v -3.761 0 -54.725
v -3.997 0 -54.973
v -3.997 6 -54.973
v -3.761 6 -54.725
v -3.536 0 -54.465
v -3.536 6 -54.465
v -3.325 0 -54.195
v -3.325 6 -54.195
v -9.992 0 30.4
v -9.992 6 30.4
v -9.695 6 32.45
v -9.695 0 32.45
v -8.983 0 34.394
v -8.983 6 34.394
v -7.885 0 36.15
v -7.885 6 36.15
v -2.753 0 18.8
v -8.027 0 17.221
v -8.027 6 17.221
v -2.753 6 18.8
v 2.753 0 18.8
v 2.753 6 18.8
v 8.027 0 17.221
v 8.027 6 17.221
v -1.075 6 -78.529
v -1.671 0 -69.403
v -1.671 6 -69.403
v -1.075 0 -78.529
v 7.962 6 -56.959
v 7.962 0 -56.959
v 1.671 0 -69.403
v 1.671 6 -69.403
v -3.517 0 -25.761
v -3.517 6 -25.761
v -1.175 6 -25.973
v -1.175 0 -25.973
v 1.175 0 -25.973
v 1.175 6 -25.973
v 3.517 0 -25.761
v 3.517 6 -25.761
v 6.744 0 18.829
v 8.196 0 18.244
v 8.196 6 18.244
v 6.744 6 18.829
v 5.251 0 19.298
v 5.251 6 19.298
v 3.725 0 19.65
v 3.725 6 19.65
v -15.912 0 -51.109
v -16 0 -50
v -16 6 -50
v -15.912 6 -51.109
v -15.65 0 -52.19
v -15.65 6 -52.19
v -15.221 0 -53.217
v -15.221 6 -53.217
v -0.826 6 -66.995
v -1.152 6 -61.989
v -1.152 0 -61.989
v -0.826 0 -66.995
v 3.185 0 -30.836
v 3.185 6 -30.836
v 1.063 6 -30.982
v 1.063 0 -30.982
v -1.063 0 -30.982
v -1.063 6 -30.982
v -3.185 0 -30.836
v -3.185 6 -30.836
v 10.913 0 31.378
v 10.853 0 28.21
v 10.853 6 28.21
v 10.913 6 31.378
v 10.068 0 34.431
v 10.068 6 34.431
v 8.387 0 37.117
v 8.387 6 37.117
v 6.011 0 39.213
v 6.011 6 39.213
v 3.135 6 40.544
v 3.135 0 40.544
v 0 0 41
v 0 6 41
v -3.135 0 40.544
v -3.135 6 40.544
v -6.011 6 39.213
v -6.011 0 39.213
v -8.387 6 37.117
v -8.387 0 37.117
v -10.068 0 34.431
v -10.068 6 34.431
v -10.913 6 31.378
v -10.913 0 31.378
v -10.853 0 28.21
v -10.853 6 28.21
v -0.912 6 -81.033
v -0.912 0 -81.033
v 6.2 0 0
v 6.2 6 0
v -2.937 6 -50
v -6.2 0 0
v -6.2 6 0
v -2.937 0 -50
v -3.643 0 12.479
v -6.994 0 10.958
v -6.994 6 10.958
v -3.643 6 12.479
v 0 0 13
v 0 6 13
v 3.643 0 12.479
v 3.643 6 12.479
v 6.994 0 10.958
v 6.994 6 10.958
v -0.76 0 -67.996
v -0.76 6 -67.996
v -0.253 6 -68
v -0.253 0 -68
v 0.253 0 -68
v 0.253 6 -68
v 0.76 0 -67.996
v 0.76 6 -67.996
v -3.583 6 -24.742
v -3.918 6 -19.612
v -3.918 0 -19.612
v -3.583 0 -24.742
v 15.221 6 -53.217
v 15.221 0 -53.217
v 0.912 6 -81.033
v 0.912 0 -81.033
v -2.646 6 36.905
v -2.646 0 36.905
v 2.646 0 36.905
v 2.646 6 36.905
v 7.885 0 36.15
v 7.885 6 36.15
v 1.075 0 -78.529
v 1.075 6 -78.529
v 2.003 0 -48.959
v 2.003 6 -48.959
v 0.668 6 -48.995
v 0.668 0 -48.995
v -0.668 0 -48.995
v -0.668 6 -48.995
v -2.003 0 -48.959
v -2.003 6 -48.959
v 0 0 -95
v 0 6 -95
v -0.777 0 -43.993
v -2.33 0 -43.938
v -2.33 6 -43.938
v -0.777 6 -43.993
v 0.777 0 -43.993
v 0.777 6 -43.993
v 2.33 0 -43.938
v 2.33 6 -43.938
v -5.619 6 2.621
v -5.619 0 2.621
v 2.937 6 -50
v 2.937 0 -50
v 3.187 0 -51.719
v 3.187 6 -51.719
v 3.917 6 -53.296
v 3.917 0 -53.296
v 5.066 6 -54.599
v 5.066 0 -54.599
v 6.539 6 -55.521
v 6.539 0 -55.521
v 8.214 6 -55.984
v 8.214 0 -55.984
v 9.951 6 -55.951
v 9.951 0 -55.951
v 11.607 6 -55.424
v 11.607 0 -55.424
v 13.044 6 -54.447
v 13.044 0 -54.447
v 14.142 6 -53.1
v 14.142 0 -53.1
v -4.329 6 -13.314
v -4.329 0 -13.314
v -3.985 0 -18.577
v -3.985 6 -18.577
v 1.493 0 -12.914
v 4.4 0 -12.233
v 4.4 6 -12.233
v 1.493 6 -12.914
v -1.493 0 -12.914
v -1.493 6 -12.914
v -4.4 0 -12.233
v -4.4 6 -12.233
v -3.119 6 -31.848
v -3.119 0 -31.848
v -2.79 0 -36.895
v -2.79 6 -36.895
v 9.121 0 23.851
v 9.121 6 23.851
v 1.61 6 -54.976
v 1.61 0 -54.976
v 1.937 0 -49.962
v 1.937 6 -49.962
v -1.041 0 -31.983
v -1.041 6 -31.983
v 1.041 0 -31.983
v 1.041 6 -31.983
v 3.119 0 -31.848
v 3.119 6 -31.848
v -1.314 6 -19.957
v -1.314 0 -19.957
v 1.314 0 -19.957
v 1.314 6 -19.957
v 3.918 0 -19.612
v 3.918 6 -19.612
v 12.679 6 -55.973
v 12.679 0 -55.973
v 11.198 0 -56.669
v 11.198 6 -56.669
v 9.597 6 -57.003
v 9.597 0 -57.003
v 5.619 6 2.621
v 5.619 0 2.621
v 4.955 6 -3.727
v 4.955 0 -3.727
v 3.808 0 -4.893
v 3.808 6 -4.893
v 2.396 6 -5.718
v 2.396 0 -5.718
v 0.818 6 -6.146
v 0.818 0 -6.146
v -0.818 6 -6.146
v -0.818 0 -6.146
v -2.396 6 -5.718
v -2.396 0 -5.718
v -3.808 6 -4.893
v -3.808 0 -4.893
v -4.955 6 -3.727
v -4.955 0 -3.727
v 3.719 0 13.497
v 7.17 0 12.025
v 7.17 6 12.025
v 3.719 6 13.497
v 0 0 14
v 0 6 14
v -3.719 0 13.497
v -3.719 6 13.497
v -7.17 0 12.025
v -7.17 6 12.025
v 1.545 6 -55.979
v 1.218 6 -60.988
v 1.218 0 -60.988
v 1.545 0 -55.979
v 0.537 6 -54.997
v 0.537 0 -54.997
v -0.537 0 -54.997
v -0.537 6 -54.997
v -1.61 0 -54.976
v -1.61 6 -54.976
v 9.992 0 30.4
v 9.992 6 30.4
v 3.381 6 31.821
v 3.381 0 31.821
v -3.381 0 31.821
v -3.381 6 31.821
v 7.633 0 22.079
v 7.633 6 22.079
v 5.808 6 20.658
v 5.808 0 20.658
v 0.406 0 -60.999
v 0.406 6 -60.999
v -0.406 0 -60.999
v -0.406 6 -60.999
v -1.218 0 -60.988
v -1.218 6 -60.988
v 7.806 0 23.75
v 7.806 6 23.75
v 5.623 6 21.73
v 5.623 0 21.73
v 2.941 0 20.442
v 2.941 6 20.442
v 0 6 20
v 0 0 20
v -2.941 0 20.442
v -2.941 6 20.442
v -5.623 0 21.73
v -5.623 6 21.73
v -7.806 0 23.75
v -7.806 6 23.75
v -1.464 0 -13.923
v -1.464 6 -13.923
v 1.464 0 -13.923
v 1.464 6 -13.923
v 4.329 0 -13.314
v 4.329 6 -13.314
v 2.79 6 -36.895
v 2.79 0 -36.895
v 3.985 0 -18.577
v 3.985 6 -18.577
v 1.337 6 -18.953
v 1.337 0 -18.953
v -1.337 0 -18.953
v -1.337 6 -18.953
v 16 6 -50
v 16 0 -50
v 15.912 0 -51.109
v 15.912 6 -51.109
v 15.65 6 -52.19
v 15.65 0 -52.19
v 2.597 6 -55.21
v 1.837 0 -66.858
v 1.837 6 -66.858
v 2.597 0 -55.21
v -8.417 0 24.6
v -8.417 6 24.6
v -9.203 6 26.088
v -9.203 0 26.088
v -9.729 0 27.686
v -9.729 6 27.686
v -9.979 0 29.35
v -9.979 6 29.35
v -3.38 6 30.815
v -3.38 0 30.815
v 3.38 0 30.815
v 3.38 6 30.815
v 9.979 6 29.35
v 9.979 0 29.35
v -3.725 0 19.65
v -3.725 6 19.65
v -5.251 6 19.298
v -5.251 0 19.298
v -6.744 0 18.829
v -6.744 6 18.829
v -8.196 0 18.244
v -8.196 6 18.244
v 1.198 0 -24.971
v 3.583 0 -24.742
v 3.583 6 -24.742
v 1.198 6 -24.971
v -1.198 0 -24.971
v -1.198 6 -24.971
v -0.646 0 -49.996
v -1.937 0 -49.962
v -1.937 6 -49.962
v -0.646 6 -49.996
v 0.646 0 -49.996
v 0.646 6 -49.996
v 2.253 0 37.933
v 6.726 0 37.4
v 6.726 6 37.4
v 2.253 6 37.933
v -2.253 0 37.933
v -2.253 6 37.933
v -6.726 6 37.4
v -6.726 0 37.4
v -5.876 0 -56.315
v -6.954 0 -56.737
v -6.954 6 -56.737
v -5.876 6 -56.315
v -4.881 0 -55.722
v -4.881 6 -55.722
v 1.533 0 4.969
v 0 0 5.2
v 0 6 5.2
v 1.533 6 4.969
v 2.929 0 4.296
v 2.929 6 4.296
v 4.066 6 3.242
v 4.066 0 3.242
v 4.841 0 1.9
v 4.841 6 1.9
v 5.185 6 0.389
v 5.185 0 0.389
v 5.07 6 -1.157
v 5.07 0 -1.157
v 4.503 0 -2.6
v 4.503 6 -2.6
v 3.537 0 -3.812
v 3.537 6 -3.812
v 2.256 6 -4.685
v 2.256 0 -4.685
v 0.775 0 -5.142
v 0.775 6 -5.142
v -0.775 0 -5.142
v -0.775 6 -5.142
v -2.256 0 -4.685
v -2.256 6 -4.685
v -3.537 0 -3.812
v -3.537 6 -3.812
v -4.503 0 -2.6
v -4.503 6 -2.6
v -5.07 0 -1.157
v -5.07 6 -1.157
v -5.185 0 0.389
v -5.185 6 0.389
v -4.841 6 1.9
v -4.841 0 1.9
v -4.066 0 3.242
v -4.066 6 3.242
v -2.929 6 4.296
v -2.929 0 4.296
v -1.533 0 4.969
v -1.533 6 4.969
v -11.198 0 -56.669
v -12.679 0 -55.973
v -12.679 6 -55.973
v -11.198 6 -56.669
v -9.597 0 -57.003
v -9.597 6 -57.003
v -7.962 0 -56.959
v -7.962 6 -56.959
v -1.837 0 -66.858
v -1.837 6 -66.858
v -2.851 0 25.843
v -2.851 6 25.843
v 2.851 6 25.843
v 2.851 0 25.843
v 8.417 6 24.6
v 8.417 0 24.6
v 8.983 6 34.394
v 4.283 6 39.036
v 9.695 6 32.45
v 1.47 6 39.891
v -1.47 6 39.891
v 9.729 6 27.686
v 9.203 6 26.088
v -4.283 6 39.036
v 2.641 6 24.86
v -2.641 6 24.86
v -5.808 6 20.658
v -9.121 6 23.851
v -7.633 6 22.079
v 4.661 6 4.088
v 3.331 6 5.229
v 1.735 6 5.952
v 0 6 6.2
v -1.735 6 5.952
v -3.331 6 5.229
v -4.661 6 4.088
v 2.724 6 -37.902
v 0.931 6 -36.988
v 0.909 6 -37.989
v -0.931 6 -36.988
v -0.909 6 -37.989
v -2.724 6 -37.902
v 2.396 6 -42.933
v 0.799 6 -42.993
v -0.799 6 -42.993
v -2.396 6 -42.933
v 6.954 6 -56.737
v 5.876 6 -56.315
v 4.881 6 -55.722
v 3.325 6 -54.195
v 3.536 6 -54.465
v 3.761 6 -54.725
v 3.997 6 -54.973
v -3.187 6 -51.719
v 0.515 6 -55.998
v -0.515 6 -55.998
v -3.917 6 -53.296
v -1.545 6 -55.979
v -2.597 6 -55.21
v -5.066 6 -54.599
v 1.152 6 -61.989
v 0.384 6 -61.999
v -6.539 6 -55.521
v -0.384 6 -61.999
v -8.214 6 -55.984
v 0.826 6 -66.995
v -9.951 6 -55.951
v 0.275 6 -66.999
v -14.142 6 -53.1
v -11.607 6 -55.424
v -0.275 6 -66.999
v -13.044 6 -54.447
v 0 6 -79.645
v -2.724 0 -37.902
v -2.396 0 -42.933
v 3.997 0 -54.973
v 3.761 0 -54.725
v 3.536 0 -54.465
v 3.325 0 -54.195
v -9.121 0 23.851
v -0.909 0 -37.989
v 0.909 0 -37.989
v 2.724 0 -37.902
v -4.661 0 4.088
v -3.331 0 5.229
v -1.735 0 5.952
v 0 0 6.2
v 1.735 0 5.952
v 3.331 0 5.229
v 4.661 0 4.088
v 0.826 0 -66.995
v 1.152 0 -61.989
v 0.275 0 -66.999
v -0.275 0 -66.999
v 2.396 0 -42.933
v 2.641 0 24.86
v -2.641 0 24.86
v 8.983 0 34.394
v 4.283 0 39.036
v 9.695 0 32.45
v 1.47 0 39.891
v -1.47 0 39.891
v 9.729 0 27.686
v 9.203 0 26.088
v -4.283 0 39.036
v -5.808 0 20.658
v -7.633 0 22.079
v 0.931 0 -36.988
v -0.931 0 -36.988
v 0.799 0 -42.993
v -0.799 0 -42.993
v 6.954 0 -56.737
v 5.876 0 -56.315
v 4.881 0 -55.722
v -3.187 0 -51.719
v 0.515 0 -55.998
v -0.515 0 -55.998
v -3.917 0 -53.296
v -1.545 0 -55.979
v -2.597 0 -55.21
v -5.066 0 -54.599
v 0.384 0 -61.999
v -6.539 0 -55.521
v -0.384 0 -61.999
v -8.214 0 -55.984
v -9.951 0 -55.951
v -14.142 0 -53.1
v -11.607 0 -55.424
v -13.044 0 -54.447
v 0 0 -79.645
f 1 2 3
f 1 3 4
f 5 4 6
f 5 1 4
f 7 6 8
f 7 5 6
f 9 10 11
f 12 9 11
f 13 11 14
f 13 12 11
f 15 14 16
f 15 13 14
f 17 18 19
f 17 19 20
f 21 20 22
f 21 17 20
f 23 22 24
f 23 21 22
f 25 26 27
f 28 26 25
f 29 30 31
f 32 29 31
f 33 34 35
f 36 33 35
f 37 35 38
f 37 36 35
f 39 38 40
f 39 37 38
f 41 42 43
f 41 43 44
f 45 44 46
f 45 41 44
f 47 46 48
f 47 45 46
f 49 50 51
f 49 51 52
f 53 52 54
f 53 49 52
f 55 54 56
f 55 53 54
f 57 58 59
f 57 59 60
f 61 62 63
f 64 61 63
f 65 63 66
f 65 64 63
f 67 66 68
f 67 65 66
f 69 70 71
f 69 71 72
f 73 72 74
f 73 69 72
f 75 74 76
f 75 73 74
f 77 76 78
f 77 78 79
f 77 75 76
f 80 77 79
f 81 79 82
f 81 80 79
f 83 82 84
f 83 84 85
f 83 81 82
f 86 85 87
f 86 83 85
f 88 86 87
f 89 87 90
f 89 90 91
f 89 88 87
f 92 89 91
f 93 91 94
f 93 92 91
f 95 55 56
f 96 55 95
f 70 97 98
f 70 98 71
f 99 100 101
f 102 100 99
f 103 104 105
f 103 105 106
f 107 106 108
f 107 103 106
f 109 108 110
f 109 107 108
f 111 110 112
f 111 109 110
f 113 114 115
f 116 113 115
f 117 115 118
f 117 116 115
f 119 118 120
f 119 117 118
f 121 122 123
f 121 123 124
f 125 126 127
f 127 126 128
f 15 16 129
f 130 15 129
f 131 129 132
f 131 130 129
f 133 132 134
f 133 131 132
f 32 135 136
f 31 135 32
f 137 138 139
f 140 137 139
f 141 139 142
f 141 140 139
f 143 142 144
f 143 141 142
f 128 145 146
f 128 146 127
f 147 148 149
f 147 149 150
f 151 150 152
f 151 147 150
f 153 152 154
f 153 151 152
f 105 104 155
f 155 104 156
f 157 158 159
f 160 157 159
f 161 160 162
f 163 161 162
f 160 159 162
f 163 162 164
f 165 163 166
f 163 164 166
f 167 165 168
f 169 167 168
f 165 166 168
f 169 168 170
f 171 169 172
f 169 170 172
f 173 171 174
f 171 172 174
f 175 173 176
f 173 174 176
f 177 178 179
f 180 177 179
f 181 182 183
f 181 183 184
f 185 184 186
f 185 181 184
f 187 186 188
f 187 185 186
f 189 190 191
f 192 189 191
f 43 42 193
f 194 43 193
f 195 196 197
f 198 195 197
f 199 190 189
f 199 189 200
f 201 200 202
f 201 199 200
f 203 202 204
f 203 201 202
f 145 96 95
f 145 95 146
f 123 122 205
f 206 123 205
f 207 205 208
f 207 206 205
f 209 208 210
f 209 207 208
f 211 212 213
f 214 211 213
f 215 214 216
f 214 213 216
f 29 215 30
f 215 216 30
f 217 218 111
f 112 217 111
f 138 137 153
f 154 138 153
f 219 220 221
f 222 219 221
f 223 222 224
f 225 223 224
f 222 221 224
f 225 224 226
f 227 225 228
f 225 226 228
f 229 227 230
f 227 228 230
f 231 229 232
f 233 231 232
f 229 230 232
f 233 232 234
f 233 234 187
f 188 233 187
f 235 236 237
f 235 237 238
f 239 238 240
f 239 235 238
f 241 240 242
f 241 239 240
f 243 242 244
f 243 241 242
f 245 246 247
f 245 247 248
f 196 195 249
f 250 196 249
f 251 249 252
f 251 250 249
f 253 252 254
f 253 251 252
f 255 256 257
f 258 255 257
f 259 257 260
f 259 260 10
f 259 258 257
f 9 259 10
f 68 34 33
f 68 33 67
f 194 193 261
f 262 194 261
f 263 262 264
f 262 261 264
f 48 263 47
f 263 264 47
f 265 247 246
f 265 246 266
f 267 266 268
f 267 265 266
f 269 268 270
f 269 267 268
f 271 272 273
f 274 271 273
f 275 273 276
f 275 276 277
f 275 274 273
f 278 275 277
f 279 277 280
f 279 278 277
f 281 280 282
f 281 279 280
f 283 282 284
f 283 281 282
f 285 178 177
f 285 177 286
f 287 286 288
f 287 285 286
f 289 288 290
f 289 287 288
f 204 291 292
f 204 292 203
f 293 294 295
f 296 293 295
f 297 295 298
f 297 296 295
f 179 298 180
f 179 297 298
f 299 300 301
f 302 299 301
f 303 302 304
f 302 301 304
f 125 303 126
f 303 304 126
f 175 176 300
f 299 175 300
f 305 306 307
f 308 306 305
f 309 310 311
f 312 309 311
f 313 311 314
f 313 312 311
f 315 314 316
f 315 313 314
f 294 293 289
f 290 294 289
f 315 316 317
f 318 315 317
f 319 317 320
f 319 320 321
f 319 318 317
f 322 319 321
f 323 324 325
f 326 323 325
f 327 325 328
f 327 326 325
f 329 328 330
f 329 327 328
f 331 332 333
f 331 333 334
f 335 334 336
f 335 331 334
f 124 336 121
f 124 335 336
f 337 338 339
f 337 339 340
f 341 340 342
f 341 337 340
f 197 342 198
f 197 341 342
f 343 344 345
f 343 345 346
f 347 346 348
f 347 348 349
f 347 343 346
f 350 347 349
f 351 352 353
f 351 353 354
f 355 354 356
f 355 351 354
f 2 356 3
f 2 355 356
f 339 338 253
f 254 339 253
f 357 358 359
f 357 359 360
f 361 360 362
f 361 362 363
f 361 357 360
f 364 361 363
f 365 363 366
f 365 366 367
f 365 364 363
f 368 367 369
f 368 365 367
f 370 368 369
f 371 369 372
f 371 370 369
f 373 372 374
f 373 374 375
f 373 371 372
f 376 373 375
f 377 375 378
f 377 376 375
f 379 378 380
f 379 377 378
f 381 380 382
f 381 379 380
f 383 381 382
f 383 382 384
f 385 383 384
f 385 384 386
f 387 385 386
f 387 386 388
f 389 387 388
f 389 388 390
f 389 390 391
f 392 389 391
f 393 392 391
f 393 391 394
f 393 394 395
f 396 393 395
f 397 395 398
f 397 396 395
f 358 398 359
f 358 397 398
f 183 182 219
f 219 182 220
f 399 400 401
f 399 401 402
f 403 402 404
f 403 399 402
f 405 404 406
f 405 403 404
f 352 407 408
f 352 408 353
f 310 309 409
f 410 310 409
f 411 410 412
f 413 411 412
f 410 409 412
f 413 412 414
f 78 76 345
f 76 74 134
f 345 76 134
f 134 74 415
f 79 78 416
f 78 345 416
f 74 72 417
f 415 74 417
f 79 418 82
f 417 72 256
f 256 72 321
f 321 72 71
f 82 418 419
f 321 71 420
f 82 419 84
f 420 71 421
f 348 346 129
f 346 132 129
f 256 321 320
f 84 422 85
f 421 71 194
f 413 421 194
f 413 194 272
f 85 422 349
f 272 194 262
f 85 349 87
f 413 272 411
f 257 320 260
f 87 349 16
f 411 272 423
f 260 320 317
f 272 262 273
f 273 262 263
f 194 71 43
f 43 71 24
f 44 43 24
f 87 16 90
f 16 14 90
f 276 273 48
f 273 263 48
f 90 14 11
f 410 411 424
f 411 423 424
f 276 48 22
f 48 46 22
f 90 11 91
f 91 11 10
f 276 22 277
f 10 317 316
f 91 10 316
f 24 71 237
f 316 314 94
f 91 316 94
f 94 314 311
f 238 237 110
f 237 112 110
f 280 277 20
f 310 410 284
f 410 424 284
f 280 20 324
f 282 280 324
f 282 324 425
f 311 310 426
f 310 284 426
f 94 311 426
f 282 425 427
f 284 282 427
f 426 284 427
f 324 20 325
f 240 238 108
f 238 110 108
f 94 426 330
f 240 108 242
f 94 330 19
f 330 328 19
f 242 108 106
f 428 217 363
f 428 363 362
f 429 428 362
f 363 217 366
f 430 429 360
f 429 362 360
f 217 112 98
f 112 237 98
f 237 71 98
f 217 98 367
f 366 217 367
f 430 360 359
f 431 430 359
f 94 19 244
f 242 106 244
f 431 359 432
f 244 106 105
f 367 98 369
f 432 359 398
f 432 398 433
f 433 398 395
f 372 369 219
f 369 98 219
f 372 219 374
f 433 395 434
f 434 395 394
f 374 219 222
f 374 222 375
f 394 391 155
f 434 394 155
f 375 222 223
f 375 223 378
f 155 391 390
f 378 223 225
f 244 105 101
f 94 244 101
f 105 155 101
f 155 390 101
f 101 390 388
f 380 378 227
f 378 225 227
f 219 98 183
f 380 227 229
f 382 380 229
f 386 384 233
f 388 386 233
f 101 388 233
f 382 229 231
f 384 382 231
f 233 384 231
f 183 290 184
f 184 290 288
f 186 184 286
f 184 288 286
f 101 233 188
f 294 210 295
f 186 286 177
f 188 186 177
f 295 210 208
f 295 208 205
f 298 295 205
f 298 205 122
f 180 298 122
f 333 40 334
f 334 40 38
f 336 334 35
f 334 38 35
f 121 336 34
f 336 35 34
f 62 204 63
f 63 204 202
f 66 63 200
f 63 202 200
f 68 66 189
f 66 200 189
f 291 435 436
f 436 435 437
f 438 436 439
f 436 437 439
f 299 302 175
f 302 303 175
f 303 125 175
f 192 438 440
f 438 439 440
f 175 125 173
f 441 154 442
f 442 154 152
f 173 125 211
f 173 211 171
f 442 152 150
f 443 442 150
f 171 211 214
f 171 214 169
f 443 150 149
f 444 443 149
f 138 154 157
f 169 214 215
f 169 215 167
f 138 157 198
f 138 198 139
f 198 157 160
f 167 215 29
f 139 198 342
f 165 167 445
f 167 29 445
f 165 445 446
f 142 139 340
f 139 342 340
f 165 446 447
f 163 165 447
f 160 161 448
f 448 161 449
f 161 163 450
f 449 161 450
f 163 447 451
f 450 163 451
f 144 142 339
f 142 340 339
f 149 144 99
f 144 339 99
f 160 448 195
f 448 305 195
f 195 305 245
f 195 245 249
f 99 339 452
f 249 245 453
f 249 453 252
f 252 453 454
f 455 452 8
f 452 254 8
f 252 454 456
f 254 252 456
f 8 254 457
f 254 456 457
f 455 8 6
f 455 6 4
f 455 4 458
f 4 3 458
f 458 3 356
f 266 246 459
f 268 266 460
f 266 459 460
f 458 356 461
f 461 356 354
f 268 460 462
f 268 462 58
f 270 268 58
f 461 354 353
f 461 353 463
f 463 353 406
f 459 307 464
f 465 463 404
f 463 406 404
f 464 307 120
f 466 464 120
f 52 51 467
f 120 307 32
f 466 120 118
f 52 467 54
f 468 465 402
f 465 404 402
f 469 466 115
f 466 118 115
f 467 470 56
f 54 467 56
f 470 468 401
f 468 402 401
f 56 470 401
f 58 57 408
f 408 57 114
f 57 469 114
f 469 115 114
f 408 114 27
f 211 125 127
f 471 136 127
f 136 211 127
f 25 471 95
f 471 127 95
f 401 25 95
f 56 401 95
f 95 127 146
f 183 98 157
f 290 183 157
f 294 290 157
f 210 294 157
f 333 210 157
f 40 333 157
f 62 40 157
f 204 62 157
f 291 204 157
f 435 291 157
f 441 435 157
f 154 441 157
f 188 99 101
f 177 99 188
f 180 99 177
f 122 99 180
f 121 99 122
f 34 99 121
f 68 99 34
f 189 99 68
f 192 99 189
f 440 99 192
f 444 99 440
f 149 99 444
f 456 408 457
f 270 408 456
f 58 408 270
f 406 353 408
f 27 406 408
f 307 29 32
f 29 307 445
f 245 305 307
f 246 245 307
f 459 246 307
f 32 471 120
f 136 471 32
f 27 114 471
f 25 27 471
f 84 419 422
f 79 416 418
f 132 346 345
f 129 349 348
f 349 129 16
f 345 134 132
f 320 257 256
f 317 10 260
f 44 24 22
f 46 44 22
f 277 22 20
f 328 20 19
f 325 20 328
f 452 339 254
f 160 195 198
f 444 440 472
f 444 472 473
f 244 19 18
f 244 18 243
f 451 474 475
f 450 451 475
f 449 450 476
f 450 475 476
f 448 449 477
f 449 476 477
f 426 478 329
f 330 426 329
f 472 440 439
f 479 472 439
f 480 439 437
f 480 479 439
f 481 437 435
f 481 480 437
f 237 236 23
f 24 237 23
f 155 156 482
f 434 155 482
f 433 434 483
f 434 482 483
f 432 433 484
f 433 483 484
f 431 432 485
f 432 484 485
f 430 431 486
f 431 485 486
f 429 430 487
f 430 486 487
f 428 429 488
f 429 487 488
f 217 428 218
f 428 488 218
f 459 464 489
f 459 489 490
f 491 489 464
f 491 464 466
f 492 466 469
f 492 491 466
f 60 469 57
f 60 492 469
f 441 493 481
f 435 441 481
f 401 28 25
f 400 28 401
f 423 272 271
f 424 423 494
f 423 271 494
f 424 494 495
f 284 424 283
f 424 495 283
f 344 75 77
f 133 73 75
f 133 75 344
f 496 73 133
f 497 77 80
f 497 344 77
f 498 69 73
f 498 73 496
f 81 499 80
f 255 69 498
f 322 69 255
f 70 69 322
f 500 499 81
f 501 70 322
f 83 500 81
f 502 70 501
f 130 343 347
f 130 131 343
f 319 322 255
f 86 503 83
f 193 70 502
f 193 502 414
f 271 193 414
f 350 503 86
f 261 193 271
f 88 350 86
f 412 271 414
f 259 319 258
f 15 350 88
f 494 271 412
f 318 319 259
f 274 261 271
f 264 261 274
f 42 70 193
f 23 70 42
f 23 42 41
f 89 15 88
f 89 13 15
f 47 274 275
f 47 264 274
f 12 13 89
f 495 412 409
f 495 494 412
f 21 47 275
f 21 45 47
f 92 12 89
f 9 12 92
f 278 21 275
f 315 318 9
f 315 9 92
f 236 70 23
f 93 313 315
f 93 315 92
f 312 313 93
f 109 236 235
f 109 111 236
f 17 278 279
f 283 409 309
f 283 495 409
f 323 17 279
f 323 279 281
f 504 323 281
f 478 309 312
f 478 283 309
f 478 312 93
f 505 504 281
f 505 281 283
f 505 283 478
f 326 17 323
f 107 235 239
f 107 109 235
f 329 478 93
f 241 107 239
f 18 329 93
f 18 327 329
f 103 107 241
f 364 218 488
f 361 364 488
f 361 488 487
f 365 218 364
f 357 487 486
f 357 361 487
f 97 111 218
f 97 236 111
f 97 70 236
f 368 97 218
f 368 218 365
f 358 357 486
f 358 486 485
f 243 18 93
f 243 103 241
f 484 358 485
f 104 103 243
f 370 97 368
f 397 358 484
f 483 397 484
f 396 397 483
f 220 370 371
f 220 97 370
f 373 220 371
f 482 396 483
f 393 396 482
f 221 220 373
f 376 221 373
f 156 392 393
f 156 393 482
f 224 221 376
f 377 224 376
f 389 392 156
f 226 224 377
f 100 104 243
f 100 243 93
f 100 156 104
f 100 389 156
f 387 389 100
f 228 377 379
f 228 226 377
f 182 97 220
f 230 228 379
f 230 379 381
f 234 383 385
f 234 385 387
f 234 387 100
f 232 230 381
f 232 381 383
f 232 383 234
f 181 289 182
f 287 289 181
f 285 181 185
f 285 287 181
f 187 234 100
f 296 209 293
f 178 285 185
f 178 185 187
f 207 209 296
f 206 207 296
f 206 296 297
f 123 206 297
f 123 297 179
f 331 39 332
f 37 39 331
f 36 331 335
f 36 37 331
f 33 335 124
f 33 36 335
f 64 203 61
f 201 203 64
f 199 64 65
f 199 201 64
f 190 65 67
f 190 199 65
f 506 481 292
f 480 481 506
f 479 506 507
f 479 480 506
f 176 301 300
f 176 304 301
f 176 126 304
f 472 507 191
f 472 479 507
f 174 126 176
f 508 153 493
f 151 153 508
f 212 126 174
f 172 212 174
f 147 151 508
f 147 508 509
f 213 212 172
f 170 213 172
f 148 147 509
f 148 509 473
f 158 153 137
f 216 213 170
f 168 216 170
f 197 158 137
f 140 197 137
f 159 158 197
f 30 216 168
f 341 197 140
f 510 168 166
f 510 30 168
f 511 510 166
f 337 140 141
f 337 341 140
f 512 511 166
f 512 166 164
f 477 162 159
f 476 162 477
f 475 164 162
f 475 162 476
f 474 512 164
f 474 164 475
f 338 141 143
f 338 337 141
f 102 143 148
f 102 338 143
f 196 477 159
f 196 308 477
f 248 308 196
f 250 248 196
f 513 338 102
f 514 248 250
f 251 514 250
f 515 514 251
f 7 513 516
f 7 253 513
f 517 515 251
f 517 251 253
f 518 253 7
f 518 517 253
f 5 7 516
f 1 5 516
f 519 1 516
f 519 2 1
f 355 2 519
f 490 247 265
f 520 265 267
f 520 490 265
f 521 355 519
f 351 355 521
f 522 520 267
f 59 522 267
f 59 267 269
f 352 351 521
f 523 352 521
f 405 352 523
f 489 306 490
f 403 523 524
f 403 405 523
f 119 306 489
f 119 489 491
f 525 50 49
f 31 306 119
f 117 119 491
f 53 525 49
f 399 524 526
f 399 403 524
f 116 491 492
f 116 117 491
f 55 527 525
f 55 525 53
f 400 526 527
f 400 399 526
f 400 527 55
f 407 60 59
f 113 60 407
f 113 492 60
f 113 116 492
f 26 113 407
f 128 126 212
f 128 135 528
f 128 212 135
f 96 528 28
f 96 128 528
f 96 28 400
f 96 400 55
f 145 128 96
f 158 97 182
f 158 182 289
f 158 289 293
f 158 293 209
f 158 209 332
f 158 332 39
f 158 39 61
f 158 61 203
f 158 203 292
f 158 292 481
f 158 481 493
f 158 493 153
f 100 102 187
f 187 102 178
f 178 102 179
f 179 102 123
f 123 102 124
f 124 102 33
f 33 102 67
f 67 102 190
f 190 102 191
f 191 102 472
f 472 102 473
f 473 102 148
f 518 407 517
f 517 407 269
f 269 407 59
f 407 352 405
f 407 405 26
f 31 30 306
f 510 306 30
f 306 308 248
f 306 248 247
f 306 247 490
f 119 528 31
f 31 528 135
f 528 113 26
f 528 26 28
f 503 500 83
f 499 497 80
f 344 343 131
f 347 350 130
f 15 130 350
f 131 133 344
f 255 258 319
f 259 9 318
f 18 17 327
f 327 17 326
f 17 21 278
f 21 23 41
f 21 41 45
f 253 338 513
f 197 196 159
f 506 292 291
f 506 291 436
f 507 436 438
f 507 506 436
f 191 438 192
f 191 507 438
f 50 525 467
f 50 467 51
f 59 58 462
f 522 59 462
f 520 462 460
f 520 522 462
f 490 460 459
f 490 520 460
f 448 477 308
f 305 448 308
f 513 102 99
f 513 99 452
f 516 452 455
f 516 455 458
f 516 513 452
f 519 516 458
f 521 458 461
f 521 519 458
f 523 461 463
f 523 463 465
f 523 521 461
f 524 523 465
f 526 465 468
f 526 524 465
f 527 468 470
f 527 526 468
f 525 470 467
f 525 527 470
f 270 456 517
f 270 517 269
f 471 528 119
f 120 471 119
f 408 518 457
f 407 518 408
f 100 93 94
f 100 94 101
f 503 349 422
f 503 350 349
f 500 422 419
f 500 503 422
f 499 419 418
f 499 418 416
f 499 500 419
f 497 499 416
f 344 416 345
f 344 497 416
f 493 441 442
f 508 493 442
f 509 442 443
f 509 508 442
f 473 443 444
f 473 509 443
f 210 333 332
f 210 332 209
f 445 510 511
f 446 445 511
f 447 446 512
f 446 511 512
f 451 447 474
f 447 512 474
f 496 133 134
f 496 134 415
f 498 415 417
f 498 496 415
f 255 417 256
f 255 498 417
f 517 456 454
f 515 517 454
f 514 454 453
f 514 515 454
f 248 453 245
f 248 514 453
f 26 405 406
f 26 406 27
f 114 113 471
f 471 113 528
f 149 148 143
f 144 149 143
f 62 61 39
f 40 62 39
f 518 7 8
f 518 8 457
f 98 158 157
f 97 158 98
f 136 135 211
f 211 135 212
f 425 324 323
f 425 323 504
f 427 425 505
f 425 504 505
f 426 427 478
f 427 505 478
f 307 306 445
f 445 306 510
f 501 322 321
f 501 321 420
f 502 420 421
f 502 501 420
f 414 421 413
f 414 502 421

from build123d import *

# Parameters (mm, degrees)
SKETCH1_R           = 5.2
SKETCH1_R_2         = 10
BOSS_EXTRUDE1_DEPTH = 6
BOSS_EXTRUDE2_DEPTH = 6
BOSS_EXTRUDE4_DEPTH = 6


with BuildPart() as part:
    # Sketch1 → Boss-Extrude1 (new body)
    with BuildSketch(Plane(origin=(0, 0, 0), x_dir=(1, 0, 0), z_dir=(0, 1, 0))):
        with BuildLine():
            Line((-6.2, 0), (0, 95))
            Line((0, 95), (6.2, 0))
            Line((6.2, 0), (10.853330552, -28.209688314))
            ThreePointArc((10.853330552, -28.209688314), (0, -41), (-10.853330552, -28.209688314))
            Line((-10.853330552, -28.209688314), (-6.2, 0))
        make_face()
        with Locations(Location((0, 0, 0), (0, 0, 270))):
            Circle(SKETCH1_R, mode=Mode.SUBTRACT)
        with Locations(Location((0, -30, 0), (0, 0, 270))):
            Circle(SKETCH1_R_2, mode=Mode.SUBTRACT)
        with BuildLine():
            Line((-9.120824245, -23.850970395), (-5.618811795, -2.620868943))
            ThreePointArc((-5.618811795, -2.620868943), (0, -6.2), (5.618811795, -2.620868943))
            Line((5.618811795, -2.620868943), (9.120824245, -23.850970395))
            ThreePointArc((9.120824245, -23.850970395), (0, -19), (-9.120824245, -23.850970395))
        make_face(mode=Mode.SUBTRACT)
        with BuildLine():
            Line((-4.954626817, 3.727153486), (0, 79.644822449))
            Line((0, 79.644822449), (4.954626817, 3.727153486))
            ThreePointArc((4.954626817, 3.727153486), (0, 6.2), (-4.954626817, 3.727153486))
        make_face(mode=Mode.SUBTRACT)
    extrude(amount=BOSS_EXTRUDE1_DEPTH)

    # Sketch3 → Boss-Extrude2 (add)
    with BuildSketch(Plane(origin=(0, 0, 0), x_dir=(1, 0, 0), z_dir=(0, 1, 0))):
        with BuildLine():
            Line((4.841629208, 13.136157224), (4.913448664, 12.035697829))
            ThreePointArc((4.913448664, 12.035697829), (0, 13), (-4.913448664, 12.035697829))
            Line((-4.913448664, 12.035697829), (-4.841629208, 13.136157224))
            ThreePointArc((-4.841629208, 13.136157224), (0, 14), (4.841629208, 13.136157224))
        make_face()
        with BuildLine():
            Line((4.426036681, 19.504107242), (4.494123165, 18.460846594))
            ThreePointArc((4.494123165, 18.460846594), (0, 19), (-4.494123165, 18.460846594))
            Line((-4.494123165, 18.460846594), (-4.426036681, 19.504107242))
            ThreePointArc((-4.426036681, 19.504107242), (0, 20), (4.426036681, 19.504107242))
        make_face()
        with BuildLine():
            Line((4.022524974, 25.686947908), (4.089332805, 24.663279531))
            ThreePointArc((4.089332805, 24.663279531), (0, 25), (-4.089332805, 24.663279531))
            Line((-4.089332805, 24.663279531), (-4.022524974, 25.686947908))
            ThreePointArc((-4.022524974, 25.686947908), (0, 26), (4.022524974, 25.686947908))
        make_face()
        with BuildLine():
            Line((3.623950699, 31.794134386), (3.690163565, 30.779582402))
            ThreePointArc((3.690163565, 30.779582402), (0, 31), (-3.690163565, 30.779582402))
            Line((-3.690163565, 30.779582402), (-3.623950699, 31.794134386))
            ThreePointArc((-3.623950699, 31.794134386), (0, 32), (3.623950699, 31.794134386))
        make_face()
        with BuildLine():
            Line((3.227899864, 37.862655249), (3.293786636, 36.853099864))
            ThreePointArc((3.293786636, 36.853099864), (0, 37), (-3.293786636, 36.853099864))
            Line((-3.293786636, 36.853099864), (-3.227899864, 37.862655249))
            ThreePointArc((-3.227899864, 37.862655249), (0, 38), (3.227899864, 37.862655249))
        make_face()
        with BuildLine():
            ThreePointArc((2.899005539, 42.902165061), (0, 43), (-2.899005539, 42.902165061))
            Line((-2.899005539, 42.902165061), (-2.833317095, 43.908681536))
            ThreePointArc((-2.833317095, 43.908681536), (0, 44), (2.833317095, 43.908681536))
            Line((2.833317095, 43.908681536), (2.899005539, 42.902165061))
        make_face()
        with BuildLine():
            ThreePointArc((2.505223913, 48.935915779), (0, 49), (-2.505223913, 48.935915779))
            Line((-2.505223913, 48.935915779), (-2.439665173, 49.94044487))
            ThreePointArc((-2.439665173, 49.94044487), (0, 50), (2.439665173, 49.94044487))
            Line((2.439665173, 49.94044487), (2.505223913, 48.935915779))
        make_face()
        with BuildLine():
            ThreePointArc((2.112110327, 54.959430401), (0, 55), (-2.112110327, 54.959430401))
            Line((-2.112110327, 54.959430401), (-2.046641092, 55.962588041))
            ThreePointArc((-2.046641092, 55.962588041), (0, 56), (2.046641092, 55.962588041))
            Line((2.046641092, 55.962588041), (2.112110327, 54.959430401))
        make_face()
        with BuildLine():
            ThreePointArc((1.719465589, 60.97576107), (0, 61), (-1.719465589, 60.97576107))
            Line((-1.719465589, 60.97576107), (-1.654060735, 61.977932227))
            ThreePointArc((-1.654060735, 61.977932227), (0, 62), (1.654060735, 61.977932227))
            Line((1.654060735, 61.977932227), (1.719465589, 60.97576107))
        make_face()
        with BuildLine():
            ThreePointArc((1.327162667, 66.986854227), (0, 67), (-1.327162667, 66.986854227))
            Line((-1.327162667, 66.986854227), (-1.261805677, 67.988291981))
            ThreePointArc((-1.261805677, 67.988291981), (0, 68), (1.261805677, 67.988291981))
            Line((1.261805677, 67.988291981), (1.327162667, 66.986854227))
        make_face()
        with BuildLine():
            Line((-7.629550902, -11.738396528), (-7.450533577, -10.653147395))
            ThreePointArc((-7.450533577, -10.653147395), (0, -13), (7.450533577, -10.653147395))
            Line((7.450533577, -10.653147395), (7.629550902, -11.738396528))
            ThreePointArc((7.629550902, -11.738396528), (0, -14), (-7.629550902, -11.738396528))
        make_face()
        with BuildLine():
            Line((-8.666516131, -18.024746826), (-8.496550368, -16.994370593))
            ThreePointArc((-8.496550368, -16.994370593), (0, -19), (8.496550368, -16.994370593))
            Line((8.496550368, -16.994370593), (8.666516131, -18.024746826))
            ThreePointArc((8.666516131, -18.024746826), (0, -20), (-8.666516131, -18.024746826))
        make_face()
        with BuildLine():
            ThreePointArc((-8.308002125, -23.579166667), (-8.614654406, -23.996856701), (-8.900326734, -24.429166667))
            ThreePointArc((-8.900326734, -24.429166667), (0, -26), (8.900326734, -24.429166667))
            ThreePointArc((8.900326734, -24.429166667), (8.614654406, -23.996856701), (8.308002125, -23.579166667))
            ThreePointArc((8.308002125, -23.579166667), (0, -25), (-8.308002125, -23.579166667))
        make_face()
        with BuildLine():
            ThreePointArc((-10.467866671, -29.179166667), (0, -31), (10.467866671, -29.179166667))
            ThreePointArc((10.467866671, -29.179166667), (10.495821222, -29.703795885), (10.497498875, -30.229166667))
            ThreePointArc((10.497498875, -30.229166667), (0, -32), (-10.497498875, -30.229166667))
            ThreePointArc((-10.497498875, -30.229166667), (-10.495821222, -29.703795885), (-10.467866671, -29.179166667))
        make_face()
        with BuildLine():
            ThreePointArc((-8.631313108, -35.979166667), (0, -37), (8.631313108, -35.979166667))
            ThreePointArc((8.631313108, -35.979166667), (8.147195247, -36.6236855), (7.61506069, -37.229166667))
            ThreePointArc((7.61506069, -37.229166667), (0, -38), (-7.61506069, -37.229166667))
            ThreePointArc((-7.61506069, -37.229166667), (-8.147195247, -36.6236855), (-8.631313108, -35.979166667))
        make_face()
    extrude(amount=BOSS_EXTRUDE2_DEPTH)

    # Sketch5 → Boss-Extrude4 (add)
    with BuildSketch(Plane(origin=(0, 0, 0), x_dir=(1, 0, 0), z_dir=(0, 1, 0))):
        with BuildLine():
            Line((14.142215569, 53.100289487), (16, 50))
            ThreePointArc((16, 50), (15.802513368, 51.654776335), (15.221146562, 53.216601654))
            ThreePointArc((15.221146562, 53.216601654), (14.136998404, 54.76748473), (12.678547514, 55.973111763))
            ThreePointArc((12.678547514, 55.973111763), (10.40739911, 56.882764317), (7.962047997, 56.959189304))
            ThreePointArc((7.962047997, 56.959189304), (7.45389818, 56.86653646), (6.953920906, 56.73683098))
            ThreePointArc((6.953920906, 56.73683098), (5.366056739, 56.038714585), (3.997401273, 54.973134308))
            ThreePointArc((3.997401273, 54.973134308), (3.646986673, 54.596241795), (3.325075946, 54.194729849))
            ThreePointArc((3.325075946, 54.194729849), (2.72869668, 53.241749875), (2.291814027, 52.205905965))
            Line((2.291814027, 52.205905965), (2.435778417, 50))
            Line((2.435778417, 50), (2.936842105, 50))
            ThreePointArc((2.936842105, 50), (7.360037623, 55.813178764), (14.142215569, 53.100289487))
        make_face()
        with BuildLine():
            ThreePointArc((6.953920906, 56.73683098), (7.45389818, 56.86653646), (7.962047997, 56.959189304))
            Line((7.962047997, 56.959189304), (1.095242719, 70.540466335))
            Line((1.095242719, 70.540466335), (1.261318946, 67.995749955))
            Line((1.261318946, 67.995749955), (6.953920906, 56.73683098))
        make_face()
        with BuildLine():
            ThreePointArc((12.678547514, 55.973111763), (14.136998404, 54.76748473), (15.221146562, 53.216601654))
            Line((15.221146562, 53.216601654), (0.337667462, 82.148474304))
            Line((0.337667462, 82.148474304), (0.501063689, 79.644822449))
            Line((0.501063689, 79.644822449), (12.678547514, 55.973111763))
        make_face()
        with BuildLine():
            Line((2.045589816, 55.978696296), (2.291814027, 52.205905965))
            ThreePointArc((2.291814027, 52.205905965), (2.72869668, 53.241749875), (3.325075946, 54.194729849))
            Line((3.325075946, 54.194729849), (2.045589816, 55.978696296))
        make_face()
    boss_extrude4 = extrude(amount=BOSS_EXTRUDE4_DEPTH)

    # Mirror1: Boss-Extrude4 across plane
    add(boss_extrude4.mirror(Plane(origin=(0, 0, 0), x_dir=(0, 0, 1), z_dir=(1, 0, 0))))


solid = part.part
